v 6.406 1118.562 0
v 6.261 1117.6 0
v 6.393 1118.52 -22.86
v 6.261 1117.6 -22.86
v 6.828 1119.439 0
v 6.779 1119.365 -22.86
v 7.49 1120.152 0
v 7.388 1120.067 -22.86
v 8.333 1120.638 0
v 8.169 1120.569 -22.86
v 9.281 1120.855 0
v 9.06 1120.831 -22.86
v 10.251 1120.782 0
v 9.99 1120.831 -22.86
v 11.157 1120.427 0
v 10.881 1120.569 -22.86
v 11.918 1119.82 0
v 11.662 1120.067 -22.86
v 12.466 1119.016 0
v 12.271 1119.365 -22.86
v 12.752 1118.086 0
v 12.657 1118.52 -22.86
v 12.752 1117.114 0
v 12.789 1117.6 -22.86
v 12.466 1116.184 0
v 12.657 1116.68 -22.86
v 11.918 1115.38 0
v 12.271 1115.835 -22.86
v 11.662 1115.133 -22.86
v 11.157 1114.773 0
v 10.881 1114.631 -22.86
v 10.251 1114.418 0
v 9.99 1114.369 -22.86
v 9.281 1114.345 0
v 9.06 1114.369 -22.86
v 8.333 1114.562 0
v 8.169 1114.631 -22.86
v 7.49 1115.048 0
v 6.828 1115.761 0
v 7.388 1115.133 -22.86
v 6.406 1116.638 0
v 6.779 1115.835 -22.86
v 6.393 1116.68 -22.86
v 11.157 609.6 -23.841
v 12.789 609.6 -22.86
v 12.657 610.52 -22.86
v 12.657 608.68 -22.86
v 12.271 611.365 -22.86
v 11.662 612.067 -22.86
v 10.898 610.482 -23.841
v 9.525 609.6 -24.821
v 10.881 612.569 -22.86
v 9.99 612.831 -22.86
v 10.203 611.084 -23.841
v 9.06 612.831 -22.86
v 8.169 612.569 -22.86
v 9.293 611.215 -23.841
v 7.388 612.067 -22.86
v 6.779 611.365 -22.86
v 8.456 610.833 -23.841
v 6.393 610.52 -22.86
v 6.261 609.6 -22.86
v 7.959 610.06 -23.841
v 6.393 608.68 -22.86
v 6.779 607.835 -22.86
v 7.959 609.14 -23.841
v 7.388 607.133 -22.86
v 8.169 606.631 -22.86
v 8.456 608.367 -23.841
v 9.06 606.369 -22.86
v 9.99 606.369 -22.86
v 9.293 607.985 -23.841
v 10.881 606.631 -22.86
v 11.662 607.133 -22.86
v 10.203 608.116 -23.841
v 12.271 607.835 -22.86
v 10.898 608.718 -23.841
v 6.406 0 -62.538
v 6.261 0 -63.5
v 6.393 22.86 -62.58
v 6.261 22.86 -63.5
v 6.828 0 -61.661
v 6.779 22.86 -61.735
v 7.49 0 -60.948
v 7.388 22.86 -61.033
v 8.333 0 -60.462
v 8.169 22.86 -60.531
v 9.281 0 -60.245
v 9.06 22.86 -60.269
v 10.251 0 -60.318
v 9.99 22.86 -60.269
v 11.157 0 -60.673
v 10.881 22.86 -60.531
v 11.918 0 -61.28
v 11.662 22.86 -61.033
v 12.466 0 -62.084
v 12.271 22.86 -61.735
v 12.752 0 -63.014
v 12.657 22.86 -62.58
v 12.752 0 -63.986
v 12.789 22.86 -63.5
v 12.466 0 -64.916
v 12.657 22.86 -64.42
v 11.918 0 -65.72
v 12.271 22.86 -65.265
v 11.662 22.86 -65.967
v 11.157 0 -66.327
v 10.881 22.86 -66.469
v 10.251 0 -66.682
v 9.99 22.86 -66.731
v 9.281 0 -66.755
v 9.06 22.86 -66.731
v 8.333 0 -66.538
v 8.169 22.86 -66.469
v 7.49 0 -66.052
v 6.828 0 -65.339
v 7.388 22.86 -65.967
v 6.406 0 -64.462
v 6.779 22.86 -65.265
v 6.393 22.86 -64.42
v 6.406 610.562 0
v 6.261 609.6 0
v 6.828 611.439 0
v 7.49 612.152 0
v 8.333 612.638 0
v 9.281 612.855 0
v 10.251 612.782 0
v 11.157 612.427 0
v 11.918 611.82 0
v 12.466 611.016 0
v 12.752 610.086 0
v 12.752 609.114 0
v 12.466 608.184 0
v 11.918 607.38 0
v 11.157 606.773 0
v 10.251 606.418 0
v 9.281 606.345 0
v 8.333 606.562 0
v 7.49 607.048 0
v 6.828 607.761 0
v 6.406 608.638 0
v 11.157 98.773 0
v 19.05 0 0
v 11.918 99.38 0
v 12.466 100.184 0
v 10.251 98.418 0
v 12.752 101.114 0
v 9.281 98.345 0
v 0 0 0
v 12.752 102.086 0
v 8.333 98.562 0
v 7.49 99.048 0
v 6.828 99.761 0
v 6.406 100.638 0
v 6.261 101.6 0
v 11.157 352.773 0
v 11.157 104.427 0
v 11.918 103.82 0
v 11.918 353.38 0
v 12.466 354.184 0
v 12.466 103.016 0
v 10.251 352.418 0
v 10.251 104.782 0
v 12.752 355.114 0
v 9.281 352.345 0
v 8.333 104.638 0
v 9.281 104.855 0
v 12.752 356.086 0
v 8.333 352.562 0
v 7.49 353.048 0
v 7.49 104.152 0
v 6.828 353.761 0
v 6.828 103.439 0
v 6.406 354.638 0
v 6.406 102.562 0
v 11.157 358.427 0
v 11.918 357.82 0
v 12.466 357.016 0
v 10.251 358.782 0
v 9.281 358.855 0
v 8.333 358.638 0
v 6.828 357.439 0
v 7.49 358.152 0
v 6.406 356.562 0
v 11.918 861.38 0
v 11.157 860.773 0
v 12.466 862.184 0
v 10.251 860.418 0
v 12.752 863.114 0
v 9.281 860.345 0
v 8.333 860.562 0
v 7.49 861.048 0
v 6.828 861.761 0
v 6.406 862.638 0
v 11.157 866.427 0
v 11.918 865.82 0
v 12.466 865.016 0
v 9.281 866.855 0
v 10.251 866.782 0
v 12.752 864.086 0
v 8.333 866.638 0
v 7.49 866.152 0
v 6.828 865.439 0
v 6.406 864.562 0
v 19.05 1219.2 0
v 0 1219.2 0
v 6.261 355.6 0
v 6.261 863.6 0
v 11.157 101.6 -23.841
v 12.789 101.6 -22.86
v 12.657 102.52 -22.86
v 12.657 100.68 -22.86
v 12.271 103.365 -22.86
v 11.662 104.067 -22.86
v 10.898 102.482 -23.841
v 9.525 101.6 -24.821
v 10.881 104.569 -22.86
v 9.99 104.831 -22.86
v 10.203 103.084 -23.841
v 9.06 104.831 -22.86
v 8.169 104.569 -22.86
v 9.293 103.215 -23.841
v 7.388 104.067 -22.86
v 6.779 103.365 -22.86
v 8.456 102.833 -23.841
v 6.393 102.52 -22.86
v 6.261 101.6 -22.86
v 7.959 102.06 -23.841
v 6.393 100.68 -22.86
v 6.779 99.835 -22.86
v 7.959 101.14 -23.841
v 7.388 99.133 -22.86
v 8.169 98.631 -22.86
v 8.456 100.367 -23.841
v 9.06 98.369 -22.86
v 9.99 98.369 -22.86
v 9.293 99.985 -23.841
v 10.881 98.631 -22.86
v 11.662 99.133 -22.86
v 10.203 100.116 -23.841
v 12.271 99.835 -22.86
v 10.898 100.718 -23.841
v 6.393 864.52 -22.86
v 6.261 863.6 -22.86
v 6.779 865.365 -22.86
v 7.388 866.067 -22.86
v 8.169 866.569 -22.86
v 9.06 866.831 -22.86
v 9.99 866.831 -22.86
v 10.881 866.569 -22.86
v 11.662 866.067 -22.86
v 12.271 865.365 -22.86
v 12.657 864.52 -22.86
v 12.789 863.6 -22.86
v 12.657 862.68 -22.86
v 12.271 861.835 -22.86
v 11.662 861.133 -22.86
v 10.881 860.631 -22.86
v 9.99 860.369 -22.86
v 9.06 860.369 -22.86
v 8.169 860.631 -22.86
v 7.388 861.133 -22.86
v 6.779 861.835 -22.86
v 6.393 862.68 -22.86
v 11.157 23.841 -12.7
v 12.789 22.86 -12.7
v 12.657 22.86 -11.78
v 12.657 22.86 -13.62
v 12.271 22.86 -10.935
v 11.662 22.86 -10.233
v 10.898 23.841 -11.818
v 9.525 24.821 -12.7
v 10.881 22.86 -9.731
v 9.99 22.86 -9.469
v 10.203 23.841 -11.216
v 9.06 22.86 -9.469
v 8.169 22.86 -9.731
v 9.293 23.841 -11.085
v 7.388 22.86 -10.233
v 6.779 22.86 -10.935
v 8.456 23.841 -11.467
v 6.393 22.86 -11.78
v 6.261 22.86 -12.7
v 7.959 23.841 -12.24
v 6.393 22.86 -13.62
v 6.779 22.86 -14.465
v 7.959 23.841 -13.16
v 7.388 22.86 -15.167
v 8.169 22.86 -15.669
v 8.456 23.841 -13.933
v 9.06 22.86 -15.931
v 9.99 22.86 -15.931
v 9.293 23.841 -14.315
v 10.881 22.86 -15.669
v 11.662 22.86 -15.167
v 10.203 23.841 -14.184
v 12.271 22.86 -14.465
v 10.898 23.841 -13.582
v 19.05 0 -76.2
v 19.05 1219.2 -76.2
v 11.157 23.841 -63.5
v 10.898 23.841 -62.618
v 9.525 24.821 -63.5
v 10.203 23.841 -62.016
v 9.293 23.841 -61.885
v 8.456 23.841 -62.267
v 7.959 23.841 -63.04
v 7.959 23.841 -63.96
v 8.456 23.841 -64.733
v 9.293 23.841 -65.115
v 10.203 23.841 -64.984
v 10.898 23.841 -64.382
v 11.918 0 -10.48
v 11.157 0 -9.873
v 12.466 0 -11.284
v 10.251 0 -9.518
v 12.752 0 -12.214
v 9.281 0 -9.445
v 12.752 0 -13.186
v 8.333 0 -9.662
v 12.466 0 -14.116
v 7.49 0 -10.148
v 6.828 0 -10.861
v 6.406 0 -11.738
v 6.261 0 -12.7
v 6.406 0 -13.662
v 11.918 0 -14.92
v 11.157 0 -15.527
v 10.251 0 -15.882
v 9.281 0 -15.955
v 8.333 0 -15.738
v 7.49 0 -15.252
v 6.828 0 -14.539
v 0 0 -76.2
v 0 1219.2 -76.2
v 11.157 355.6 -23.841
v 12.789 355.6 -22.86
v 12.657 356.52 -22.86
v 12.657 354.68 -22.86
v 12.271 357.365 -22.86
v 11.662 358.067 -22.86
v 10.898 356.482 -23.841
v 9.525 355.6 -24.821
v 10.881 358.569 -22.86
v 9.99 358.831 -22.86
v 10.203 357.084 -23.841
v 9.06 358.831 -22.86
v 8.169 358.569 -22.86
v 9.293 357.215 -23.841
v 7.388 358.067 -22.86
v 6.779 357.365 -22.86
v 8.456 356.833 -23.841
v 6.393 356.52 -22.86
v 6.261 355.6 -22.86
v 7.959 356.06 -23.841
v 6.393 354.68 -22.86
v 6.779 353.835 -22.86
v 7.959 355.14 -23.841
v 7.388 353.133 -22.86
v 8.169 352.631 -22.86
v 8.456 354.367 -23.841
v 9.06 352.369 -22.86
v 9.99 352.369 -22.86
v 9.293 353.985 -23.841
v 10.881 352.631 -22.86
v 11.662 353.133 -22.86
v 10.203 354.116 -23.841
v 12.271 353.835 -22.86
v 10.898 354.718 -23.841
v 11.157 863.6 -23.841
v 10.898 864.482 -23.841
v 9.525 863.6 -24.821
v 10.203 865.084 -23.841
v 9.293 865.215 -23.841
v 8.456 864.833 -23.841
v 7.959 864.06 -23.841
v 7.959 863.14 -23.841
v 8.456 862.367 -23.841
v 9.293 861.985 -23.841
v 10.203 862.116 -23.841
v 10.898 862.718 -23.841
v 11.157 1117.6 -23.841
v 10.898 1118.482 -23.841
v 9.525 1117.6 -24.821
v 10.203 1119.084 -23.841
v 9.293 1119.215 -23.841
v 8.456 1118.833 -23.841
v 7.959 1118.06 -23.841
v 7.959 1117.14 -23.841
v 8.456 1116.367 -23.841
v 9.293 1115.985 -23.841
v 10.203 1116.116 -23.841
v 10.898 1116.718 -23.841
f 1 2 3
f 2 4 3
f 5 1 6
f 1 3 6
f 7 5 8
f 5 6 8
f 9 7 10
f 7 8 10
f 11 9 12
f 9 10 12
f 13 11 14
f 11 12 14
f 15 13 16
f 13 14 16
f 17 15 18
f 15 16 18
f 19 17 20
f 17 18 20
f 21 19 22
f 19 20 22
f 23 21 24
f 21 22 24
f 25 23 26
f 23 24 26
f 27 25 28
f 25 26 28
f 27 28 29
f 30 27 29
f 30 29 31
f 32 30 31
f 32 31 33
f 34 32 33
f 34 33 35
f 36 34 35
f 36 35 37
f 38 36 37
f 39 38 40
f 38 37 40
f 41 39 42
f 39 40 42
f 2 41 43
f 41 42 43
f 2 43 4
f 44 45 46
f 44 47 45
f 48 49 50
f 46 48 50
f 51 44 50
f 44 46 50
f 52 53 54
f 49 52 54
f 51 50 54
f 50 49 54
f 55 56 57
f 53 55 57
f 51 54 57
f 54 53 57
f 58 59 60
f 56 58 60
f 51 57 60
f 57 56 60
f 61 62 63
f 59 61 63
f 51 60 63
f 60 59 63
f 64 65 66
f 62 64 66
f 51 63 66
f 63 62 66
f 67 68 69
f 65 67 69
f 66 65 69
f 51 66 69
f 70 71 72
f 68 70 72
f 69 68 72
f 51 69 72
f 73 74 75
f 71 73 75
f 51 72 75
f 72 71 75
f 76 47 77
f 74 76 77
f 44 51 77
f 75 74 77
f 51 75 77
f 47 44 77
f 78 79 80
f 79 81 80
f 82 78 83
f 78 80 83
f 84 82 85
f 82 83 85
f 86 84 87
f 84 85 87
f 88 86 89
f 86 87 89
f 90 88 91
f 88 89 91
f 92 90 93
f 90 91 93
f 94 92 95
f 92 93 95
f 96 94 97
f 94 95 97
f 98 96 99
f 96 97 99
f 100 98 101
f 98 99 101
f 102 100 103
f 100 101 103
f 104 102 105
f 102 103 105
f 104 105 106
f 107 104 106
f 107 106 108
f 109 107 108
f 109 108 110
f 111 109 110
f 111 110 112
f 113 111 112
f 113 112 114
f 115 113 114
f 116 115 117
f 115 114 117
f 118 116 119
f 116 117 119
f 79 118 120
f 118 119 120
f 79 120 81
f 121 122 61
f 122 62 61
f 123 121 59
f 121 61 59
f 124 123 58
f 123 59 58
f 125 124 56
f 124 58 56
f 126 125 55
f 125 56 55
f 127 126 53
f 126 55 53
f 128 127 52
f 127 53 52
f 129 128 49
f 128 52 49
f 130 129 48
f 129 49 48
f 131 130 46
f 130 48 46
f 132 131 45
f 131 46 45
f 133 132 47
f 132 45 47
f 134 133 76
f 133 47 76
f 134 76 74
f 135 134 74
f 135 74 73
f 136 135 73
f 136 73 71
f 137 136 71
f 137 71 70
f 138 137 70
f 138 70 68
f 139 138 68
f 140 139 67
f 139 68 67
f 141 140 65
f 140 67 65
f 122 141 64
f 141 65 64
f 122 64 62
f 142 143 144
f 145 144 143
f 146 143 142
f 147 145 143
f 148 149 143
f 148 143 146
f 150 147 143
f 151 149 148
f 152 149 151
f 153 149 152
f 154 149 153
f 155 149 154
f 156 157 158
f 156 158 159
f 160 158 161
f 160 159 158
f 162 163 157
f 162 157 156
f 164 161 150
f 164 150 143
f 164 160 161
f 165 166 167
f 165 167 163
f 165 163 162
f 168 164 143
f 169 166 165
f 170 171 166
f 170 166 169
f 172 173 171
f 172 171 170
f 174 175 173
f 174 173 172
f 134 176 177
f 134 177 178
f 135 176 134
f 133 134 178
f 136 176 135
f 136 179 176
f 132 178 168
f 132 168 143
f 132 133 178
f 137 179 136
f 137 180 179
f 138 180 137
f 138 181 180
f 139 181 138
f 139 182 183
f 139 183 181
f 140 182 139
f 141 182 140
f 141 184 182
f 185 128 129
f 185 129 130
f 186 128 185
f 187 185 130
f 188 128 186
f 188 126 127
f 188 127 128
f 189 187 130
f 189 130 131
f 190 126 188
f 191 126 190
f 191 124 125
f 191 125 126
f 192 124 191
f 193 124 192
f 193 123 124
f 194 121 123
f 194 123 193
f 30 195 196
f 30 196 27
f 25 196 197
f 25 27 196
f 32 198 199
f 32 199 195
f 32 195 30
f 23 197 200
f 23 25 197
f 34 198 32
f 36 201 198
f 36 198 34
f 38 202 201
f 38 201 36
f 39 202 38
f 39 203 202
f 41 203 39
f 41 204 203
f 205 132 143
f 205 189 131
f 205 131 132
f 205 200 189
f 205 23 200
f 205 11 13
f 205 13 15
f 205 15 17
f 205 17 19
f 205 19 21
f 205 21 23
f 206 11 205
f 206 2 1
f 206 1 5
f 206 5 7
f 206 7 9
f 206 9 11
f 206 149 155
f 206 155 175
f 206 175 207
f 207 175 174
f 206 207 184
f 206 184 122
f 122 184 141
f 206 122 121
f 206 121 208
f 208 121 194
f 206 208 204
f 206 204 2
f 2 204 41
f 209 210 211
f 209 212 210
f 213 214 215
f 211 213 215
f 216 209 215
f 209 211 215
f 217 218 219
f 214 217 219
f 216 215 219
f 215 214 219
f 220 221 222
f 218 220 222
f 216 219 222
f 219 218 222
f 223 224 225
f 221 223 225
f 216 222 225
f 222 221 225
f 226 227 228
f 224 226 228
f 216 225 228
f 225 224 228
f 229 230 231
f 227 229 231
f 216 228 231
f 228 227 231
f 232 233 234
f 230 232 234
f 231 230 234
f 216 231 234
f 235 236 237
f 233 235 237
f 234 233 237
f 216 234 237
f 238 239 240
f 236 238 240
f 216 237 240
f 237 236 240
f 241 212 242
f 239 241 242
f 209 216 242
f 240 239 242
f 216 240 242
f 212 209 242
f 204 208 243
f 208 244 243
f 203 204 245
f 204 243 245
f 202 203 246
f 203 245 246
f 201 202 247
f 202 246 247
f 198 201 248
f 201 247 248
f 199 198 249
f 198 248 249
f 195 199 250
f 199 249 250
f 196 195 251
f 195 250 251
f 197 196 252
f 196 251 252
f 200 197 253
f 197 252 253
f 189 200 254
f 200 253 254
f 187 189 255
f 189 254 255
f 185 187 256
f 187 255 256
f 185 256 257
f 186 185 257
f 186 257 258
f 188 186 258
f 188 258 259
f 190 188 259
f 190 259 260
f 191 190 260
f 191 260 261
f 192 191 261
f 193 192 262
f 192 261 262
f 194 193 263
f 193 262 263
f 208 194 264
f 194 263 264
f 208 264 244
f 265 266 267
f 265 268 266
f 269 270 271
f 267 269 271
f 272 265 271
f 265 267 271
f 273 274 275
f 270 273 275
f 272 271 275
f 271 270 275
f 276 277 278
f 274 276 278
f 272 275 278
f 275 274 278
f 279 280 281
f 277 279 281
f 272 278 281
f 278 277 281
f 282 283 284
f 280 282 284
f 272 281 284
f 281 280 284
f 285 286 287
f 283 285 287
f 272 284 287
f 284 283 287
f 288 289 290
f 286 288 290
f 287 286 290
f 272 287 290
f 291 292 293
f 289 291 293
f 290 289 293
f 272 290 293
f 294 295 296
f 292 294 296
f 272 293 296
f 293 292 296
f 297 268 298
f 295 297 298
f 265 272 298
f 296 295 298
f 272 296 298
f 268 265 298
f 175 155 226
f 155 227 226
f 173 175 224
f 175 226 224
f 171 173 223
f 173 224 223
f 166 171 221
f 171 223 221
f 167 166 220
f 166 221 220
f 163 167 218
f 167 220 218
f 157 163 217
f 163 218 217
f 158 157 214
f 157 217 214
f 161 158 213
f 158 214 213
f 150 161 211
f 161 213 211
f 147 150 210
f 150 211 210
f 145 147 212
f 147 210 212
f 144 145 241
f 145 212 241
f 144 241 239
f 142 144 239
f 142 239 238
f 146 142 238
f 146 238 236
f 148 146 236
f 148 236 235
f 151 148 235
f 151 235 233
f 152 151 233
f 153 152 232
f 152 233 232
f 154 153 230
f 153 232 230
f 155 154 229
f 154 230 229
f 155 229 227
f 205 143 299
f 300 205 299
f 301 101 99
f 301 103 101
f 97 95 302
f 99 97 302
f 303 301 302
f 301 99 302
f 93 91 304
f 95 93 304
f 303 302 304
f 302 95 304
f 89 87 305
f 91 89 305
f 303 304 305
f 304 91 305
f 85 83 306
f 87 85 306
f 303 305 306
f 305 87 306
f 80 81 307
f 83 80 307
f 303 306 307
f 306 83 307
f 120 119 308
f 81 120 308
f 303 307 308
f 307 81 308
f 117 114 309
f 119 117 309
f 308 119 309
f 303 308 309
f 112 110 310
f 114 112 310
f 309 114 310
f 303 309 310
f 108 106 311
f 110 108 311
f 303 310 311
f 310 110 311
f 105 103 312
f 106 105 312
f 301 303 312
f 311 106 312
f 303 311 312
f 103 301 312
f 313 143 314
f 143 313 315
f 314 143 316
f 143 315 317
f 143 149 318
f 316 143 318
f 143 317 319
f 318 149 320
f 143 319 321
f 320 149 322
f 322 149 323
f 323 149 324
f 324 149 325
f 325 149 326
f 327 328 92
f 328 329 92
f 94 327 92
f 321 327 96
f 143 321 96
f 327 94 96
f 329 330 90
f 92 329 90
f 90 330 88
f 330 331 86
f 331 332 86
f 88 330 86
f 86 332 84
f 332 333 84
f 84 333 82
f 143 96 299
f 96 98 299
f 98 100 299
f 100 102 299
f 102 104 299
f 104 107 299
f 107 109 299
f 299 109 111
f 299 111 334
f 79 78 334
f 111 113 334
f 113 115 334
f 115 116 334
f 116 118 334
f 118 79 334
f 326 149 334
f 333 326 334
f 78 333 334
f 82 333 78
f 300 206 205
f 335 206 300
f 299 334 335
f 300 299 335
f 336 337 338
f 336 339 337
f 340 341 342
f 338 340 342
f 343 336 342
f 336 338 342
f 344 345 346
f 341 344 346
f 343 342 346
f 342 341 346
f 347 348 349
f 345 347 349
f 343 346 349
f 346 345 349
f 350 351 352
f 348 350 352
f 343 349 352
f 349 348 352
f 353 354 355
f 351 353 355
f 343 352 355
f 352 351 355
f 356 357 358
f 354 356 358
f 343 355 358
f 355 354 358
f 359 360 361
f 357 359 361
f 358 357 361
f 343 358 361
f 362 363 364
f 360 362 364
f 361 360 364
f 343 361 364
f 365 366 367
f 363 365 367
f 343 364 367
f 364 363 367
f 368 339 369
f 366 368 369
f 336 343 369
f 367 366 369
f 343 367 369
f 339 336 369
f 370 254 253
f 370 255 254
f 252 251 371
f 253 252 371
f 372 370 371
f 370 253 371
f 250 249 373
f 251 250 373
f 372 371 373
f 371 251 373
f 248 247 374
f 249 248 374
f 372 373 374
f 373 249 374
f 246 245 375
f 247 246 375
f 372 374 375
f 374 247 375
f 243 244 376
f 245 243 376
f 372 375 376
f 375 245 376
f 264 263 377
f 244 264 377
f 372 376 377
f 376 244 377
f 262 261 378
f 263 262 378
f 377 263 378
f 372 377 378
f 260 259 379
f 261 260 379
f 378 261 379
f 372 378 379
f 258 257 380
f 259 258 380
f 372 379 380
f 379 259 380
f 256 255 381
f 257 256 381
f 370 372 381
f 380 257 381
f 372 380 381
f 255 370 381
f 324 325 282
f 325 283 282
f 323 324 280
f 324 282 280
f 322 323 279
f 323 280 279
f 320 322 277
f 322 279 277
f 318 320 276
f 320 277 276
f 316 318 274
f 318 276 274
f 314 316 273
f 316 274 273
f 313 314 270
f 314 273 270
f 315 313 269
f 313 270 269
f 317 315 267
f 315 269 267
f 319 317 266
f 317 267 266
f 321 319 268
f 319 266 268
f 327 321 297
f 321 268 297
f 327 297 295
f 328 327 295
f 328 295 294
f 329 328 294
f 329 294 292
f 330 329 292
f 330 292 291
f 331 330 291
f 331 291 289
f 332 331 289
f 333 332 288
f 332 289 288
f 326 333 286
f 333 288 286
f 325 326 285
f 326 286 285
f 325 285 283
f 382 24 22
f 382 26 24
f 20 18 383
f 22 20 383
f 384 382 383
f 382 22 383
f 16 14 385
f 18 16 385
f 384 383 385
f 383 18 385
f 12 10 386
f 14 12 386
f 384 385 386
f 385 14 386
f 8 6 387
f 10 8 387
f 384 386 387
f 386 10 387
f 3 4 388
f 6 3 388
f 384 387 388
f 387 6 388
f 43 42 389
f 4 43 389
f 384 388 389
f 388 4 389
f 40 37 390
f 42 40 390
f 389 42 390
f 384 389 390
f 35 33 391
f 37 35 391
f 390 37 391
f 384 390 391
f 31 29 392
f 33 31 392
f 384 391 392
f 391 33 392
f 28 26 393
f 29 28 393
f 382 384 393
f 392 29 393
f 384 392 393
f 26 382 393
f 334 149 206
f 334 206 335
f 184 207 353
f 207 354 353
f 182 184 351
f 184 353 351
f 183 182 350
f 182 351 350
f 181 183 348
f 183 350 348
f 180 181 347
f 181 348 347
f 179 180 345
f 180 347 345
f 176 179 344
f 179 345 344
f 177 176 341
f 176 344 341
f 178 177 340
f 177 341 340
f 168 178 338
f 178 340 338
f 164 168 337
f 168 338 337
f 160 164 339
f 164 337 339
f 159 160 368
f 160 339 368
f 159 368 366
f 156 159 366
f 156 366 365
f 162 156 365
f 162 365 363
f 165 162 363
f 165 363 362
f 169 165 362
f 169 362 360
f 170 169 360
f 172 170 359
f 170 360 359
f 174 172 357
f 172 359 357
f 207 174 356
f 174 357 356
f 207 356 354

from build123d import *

# Parameters (mm, degrees)
SKETCH1_W                    = 76.2
SKETCH1_H                    = 1219.2
EXTRUDE1_DEPTH               = 19.05
F_5_16_18_TAPPED_HOLE1_D     = 6.5278
F_5_16_18_TAPPED_HOLE1_DEPTH = 22.86
F_5_16_18_TAPPED_HOLE1_TIP   = 1.961148974
F_5_16_18_TAPPED_HOLE2_D     = 6.5278
F_5_16_18_TAPPED_HOLE2_DEPTH = 22.86
F_5_16_18_TAPPED_HOLE2_TIP   = 1.961148974


with BuildPart() as part:
    # Sketch1 → Extrude1 (new body)
    with BuildSketch(Plane(origin=(0, 0, 0), x_dir=(0, 0, -1), z_dir=(1, 0, 0))):
        with Locations((38.1, 609.6)):
            Rectangle(SKETCH1_W, SKETCH1_H)
    extrude(amount=EXTRUDE1_DEPTH)

    # 5/16-18 Tapped Hole1
    with Locations(Plane.XY):
        with Locations((9.525, 1117.6), (9.525, 863.6), (9.525, 609.6), (9.525, 355.6), (9.525, 101.6)):
            Hole(F_5_16_18_TAPPED_HOLE1_D / 2, depth=F_5_16_18_TAPPED_HOLE1_DEPTH)
            with Locations((0, 0, -(F_5_16_18_TAPPED_HOLE1_DEPTH + F_5_16_18_TAPPED_HOLE1_TIP / 2))):  # 118° drill point
                Cone(0, F_5_16_18_TAPPED_HOLE1_D / 2, F_5_16_18_TAPPED_HOLE1_TIP, mode=Mode.SUBTRACT)

    # 5/16-18 Tapped Hole2
    with Locations(Plane.XZ):
        with Locations((9.525, -63.5), (9.525, -12.7)):
            Hole(F_5_16_18_TAPPED_HOLE2_D / 2, depth=F_5_16_18_TAPPED_HOLE2_DEPTH)
            with Locations((0, 0, -(F_5_16_18_TAPPED_HOLE2_DEPTH + F_5_16_18_TAPPED_HOLE2_TIP / 2))):  # 118° drill point
                Cone(0, F_5_16_18_TAPPED_HOLE2_D / 2, F_5_16_18_TAPPED_HOLE2_TIP, mode=Mode.SUBTRACT)


solid = part.part
